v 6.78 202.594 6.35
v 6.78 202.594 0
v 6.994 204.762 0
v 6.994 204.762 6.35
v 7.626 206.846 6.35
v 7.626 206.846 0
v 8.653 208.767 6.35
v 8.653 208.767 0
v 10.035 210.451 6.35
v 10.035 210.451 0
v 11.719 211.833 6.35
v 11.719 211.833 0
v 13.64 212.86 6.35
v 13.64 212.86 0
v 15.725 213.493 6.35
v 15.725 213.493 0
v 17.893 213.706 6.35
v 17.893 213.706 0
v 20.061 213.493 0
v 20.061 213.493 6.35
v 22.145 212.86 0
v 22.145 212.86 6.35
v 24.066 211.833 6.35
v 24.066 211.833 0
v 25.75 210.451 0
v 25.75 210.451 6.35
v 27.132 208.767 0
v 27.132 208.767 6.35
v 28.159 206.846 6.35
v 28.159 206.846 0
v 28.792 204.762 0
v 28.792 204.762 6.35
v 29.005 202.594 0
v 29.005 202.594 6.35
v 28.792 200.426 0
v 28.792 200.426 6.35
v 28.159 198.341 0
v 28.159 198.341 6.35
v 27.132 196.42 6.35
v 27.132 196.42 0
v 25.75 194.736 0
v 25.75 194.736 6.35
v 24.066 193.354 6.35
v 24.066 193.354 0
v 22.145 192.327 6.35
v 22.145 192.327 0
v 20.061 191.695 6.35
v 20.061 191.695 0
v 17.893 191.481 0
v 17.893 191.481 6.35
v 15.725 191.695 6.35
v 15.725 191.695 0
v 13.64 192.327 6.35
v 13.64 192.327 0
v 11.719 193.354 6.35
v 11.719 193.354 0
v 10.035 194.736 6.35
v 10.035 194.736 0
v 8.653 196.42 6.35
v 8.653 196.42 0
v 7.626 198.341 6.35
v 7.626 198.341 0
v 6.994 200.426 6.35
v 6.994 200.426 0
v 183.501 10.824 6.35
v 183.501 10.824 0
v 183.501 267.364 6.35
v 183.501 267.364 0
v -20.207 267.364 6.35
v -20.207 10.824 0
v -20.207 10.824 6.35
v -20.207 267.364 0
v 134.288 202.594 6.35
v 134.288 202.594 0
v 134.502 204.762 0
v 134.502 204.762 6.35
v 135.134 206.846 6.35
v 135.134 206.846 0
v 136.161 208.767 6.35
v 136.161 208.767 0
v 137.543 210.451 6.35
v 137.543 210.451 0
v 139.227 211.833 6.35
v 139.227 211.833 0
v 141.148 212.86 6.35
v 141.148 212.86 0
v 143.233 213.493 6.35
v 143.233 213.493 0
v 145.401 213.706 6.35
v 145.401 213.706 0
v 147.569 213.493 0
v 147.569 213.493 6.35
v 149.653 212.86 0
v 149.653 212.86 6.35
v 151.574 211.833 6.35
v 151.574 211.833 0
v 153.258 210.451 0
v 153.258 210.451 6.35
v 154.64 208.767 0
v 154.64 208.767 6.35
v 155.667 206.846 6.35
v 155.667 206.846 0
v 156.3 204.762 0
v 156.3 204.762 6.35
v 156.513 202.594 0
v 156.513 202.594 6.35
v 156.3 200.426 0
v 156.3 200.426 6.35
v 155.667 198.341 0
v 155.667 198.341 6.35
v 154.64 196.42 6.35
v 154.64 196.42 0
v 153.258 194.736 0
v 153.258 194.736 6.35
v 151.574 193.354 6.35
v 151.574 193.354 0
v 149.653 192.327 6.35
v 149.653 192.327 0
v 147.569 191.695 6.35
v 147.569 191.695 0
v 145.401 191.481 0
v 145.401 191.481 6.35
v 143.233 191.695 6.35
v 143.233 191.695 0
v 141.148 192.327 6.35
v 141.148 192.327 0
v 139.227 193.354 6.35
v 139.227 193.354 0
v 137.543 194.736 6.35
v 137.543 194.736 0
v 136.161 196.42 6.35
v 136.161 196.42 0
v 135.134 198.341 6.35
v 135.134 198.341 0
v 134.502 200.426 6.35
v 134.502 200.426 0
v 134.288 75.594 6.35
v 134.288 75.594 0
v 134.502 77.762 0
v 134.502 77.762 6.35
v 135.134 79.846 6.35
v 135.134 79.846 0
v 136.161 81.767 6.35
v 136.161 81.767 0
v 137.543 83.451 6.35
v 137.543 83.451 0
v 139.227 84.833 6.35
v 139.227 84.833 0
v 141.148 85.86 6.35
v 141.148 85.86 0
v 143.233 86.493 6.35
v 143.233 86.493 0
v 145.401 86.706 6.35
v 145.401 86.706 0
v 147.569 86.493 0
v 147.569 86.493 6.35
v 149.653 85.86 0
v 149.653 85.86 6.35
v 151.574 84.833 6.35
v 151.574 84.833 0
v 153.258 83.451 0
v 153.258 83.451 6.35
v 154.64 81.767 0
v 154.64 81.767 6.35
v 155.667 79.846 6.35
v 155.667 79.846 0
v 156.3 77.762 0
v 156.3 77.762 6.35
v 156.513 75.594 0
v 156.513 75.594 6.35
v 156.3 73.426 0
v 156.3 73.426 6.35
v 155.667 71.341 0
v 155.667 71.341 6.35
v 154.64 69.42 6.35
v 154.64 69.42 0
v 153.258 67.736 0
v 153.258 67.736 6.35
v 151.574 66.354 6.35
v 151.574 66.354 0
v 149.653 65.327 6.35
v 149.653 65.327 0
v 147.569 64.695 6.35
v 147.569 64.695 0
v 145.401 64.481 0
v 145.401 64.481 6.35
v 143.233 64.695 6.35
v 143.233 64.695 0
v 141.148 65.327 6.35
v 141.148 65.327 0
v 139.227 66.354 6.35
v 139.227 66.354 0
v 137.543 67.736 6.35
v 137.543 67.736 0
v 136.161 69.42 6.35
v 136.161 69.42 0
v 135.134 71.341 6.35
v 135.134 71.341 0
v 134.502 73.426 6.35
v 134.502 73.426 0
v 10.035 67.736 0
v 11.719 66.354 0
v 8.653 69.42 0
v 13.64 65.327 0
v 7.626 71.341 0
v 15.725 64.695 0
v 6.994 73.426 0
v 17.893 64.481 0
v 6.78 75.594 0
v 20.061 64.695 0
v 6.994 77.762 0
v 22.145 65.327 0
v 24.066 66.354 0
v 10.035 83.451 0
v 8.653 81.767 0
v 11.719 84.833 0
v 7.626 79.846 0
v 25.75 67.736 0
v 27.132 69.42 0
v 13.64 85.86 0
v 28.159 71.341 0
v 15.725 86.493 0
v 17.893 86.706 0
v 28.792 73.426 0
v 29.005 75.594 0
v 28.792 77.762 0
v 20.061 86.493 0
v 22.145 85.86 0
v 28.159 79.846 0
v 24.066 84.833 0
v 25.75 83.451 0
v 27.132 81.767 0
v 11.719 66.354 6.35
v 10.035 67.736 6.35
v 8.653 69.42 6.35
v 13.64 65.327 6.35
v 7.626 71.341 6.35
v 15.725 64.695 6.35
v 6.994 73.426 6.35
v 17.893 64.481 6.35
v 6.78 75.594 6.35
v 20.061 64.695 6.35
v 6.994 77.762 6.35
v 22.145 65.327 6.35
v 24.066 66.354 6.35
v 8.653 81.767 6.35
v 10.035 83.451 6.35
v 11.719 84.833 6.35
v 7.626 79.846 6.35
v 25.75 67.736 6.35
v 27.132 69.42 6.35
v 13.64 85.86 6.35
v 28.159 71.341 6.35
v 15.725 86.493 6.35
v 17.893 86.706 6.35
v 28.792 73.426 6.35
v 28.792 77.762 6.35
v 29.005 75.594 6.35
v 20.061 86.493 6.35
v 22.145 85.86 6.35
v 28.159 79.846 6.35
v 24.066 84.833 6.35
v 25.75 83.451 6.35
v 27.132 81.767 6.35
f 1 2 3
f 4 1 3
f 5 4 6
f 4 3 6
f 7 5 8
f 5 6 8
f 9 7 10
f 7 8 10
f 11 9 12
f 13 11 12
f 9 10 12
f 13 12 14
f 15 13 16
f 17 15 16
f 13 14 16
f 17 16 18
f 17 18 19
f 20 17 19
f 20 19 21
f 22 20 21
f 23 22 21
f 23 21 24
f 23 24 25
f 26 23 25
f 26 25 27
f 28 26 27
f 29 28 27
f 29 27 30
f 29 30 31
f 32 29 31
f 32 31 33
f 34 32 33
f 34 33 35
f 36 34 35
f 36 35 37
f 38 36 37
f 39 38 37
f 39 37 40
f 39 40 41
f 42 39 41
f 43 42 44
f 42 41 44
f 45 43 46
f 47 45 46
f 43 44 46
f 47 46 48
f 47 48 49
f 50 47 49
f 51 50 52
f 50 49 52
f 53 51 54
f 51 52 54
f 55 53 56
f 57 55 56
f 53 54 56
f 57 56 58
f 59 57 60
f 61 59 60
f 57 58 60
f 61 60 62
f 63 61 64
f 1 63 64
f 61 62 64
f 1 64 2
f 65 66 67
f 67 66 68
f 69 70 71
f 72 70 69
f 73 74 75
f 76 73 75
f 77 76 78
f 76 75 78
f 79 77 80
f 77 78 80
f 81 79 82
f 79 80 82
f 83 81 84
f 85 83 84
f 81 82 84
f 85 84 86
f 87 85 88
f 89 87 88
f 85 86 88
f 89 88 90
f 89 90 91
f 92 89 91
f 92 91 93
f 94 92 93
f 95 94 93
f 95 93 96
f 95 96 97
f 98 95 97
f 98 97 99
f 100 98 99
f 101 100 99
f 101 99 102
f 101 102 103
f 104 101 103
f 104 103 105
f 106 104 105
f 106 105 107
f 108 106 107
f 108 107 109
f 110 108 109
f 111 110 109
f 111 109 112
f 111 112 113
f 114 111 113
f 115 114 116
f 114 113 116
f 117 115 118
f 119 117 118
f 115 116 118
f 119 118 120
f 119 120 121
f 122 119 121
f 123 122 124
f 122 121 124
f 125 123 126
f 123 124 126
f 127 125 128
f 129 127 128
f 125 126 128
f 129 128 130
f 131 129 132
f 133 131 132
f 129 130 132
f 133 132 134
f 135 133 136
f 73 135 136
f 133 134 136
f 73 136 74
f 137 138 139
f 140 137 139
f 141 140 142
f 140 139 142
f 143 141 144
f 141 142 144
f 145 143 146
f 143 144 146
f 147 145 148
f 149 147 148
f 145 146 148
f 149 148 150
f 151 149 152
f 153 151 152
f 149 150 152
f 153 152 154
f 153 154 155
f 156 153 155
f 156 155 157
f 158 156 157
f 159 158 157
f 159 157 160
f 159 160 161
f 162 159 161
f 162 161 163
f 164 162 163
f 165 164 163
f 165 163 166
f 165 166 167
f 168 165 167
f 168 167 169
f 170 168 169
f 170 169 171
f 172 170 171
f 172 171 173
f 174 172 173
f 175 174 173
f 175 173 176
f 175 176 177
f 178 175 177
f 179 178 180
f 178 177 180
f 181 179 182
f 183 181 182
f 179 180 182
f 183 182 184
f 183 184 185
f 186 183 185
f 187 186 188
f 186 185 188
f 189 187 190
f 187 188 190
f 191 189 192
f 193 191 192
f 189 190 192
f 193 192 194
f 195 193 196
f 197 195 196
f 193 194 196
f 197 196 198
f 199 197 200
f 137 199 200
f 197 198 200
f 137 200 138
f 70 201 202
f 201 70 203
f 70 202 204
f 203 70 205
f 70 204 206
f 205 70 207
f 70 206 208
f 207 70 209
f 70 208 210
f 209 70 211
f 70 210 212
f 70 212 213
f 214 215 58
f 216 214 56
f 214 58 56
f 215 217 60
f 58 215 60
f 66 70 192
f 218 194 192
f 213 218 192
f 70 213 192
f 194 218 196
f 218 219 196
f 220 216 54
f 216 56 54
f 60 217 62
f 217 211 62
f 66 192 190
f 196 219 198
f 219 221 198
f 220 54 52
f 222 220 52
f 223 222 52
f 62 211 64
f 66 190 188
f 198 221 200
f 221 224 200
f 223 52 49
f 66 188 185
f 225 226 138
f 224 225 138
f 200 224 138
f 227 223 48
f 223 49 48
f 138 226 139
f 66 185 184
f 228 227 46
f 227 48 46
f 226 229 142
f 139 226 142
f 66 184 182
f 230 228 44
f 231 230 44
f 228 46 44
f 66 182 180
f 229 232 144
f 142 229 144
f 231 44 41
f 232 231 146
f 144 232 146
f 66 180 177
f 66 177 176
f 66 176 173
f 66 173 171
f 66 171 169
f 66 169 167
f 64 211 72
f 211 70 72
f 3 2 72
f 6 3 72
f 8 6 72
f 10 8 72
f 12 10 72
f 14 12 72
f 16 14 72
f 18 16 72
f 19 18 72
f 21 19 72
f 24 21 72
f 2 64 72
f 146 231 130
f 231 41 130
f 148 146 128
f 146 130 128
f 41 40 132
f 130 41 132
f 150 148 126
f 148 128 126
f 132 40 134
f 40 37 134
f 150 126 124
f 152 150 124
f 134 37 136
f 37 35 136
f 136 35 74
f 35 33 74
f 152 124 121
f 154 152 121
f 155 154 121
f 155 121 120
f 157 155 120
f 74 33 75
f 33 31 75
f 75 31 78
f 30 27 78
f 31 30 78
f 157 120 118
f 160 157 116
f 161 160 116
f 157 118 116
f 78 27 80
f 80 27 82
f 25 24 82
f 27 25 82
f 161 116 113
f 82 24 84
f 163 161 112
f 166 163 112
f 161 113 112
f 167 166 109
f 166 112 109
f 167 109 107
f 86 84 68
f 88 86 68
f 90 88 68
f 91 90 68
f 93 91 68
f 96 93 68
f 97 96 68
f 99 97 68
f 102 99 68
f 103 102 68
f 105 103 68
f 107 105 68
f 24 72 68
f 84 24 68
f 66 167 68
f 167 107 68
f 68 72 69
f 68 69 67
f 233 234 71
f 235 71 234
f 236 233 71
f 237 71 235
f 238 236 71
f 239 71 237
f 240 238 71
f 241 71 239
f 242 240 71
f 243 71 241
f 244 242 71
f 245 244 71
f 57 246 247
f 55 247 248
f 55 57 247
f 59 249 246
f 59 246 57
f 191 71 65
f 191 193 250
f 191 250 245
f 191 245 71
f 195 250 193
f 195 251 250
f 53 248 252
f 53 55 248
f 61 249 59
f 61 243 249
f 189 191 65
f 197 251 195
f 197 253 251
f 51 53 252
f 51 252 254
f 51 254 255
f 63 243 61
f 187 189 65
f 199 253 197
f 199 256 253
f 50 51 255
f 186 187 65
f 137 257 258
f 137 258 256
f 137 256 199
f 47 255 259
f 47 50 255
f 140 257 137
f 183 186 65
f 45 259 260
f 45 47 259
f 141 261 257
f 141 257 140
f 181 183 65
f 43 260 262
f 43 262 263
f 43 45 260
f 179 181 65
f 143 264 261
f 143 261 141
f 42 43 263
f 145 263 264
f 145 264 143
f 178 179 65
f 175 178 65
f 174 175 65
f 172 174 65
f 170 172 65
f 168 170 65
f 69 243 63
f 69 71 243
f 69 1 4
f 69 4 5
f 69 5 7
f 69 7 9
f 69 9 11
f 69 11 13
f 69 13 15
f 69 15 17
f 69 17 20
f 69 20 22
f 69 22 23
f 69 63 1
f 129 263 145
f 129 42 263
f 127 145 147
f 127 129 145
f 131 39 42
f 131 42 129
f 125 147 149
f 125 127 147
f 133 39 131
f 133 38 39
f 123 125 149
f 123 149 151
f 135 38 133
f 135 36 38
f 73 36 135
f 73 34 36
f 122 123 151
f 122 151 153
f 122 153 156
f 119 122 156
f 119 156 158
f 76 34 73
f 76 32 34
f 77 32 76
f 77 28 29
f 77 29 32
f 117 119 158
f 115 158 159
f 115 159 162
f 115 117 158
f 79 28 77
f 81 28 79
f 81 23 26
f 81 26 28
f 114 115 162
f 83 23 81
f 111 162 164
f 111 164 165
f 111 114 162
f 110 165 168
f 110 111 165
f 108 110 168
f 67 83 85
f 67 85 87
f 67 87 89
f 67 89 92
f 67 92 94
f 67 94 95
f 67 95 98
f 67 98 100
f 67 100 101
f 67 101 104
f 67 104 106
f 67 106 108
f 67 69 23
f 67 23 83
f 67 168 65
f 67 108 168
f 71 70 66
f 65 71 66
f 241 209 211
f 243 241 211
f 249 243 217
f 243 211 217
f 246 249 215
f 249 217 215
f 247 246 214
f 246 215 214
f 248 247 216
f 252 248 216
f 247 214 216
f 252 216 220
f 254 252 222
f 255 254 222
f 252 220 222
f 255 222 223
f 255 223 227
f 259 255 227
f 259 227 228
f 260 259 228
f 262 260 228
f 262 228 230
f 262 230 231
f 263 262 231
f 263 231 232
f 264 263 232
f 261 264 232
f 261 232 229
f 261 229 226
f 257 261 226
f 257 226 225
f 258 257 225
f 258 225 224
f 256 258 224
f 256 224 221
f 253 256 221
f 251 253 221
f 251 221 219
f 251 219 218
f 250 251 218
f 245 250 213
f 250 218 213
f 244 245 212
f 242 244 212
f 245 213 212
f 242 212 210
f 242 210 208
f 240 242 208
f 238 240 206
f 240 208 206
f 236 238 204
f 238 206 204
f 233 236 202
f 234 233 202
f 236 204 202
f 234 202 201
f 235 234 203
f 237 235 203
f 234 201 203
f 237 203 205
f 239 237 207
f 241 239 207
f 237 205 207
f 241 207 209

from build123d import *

# Parameters (mm, degrees)
SKETCH1_W           = 203.708
SKETCH1_H           = 256.54
BOSS_EXTRUDE1_DEPTH = 6.35
CUT_EXTRUDE1_REACH  = 326.339
SKETCH2_R           = 11.1125


with BuildPart() as part:
    # Sketch1 → Boss-Extrude1 (new body)
    with BuildSketch(Plane.XY):
        with Locations((81.646636302, 139.093604852)):
            Rectangle(SKETCH1_W, SKETCH1_H)
    extrude(amount=BOSS_EXTRUDE1_DEPTH)

    # Sketch2 → Cut-Extrude1 (cut, up to next)
    with BuildSketch(Plane(origin=(0, 0, 0), x_dir=(-1, 0, 0), z_dir=(0, 0, -1)), mode=Mode.PRIVATE) as cut_extrude1_sk1:
        with Locations((-145.400636302, 202.593604852)):
            Circle(SKETCH2_R)
    cut_extrude1_tool1 = extrude(cut_extrude1_sk1.sketch, amount=-CUT_EXTRUDE1_REACH, mode=Mode.PRIVATE) & part.part
    # Sketch2 → Cut-Extrude1 (cut, up to next)
    with BuildSketch(Plane(origin=(0, 0, 0), x_dir=(-1, 0, 0), z_dir=(0, 0, -1)), mode=Mode.PRIVATE) as cut_extrude1_sk2:
        with Locations((-145.400636302, 75.593604852)):
            Circle(SKETCH2_R)
    cut_extrude1_tool2 = extrude(cut_extrude1_sk2.sketch, amount=-CUT_EXTRUDE1_REACH, mode=Mode.PRIVATE) & part.part
    # Sketch2 → Cut-Extrude1 (cut, up to next)
    with BuildSketch(Plane(origin=(0, 0, 0), x_dir=(-1, 0, 0), z_dir=(0, 0, -1)), mode=Mode.PRIVATE) as cut_extrude1_sk3:
        with Locations((-17.892636302, 202.593604852)):
            Circle(SKETCH2_R)
    cut_extrude1_tool3 = extrude(cut_extrude1_sk3.sketch, amount=-CUT_EXTRUDE1_REACH, mode=Mode.PRIVATE) & part.part
    # Sketch2 → Cut-Extrude1 (cut, up to next)
    with BuildSketch(Plane(origin=(0, 0, 0), x_dir=(-1, 0, 0), z_dir=(0, 0, -1)), mode=Mode.PRIVATE) as cut_extrude1_sk4:
        with Locations((-17.892636302, 75.593604852)):
            Circle(SKETCH2_R)
    cut_extrude1_tool4 = extrude(cut_extrude1_sk4.sketch, amount=-CUT_EXTRUDE1_REACH, mode=Mode.PRIVATE) & part.part
    add(cut_extrude1_tool1.solids().sort_by_distance((145.400636, 202.593605, 0))[0], mode=Mode.SUBTRACT)
    add(cut_extrude1_tool2.solids().sort_by_distance((145.400636, 75.593605, 0))[0], mode=Mode.SUBTRACT)
    add(cut_extrude1_tool3.solids().sort_by_distance((17.892636, 202.593605, 0))[0], mode=Mode.SUBTRACT)
    add(cut_extrude1_tool4.solids().sort_by_distance((17.892636, 75.593605, 0))[0], mode=Mode.SUBTRACT)


solid = part.part
